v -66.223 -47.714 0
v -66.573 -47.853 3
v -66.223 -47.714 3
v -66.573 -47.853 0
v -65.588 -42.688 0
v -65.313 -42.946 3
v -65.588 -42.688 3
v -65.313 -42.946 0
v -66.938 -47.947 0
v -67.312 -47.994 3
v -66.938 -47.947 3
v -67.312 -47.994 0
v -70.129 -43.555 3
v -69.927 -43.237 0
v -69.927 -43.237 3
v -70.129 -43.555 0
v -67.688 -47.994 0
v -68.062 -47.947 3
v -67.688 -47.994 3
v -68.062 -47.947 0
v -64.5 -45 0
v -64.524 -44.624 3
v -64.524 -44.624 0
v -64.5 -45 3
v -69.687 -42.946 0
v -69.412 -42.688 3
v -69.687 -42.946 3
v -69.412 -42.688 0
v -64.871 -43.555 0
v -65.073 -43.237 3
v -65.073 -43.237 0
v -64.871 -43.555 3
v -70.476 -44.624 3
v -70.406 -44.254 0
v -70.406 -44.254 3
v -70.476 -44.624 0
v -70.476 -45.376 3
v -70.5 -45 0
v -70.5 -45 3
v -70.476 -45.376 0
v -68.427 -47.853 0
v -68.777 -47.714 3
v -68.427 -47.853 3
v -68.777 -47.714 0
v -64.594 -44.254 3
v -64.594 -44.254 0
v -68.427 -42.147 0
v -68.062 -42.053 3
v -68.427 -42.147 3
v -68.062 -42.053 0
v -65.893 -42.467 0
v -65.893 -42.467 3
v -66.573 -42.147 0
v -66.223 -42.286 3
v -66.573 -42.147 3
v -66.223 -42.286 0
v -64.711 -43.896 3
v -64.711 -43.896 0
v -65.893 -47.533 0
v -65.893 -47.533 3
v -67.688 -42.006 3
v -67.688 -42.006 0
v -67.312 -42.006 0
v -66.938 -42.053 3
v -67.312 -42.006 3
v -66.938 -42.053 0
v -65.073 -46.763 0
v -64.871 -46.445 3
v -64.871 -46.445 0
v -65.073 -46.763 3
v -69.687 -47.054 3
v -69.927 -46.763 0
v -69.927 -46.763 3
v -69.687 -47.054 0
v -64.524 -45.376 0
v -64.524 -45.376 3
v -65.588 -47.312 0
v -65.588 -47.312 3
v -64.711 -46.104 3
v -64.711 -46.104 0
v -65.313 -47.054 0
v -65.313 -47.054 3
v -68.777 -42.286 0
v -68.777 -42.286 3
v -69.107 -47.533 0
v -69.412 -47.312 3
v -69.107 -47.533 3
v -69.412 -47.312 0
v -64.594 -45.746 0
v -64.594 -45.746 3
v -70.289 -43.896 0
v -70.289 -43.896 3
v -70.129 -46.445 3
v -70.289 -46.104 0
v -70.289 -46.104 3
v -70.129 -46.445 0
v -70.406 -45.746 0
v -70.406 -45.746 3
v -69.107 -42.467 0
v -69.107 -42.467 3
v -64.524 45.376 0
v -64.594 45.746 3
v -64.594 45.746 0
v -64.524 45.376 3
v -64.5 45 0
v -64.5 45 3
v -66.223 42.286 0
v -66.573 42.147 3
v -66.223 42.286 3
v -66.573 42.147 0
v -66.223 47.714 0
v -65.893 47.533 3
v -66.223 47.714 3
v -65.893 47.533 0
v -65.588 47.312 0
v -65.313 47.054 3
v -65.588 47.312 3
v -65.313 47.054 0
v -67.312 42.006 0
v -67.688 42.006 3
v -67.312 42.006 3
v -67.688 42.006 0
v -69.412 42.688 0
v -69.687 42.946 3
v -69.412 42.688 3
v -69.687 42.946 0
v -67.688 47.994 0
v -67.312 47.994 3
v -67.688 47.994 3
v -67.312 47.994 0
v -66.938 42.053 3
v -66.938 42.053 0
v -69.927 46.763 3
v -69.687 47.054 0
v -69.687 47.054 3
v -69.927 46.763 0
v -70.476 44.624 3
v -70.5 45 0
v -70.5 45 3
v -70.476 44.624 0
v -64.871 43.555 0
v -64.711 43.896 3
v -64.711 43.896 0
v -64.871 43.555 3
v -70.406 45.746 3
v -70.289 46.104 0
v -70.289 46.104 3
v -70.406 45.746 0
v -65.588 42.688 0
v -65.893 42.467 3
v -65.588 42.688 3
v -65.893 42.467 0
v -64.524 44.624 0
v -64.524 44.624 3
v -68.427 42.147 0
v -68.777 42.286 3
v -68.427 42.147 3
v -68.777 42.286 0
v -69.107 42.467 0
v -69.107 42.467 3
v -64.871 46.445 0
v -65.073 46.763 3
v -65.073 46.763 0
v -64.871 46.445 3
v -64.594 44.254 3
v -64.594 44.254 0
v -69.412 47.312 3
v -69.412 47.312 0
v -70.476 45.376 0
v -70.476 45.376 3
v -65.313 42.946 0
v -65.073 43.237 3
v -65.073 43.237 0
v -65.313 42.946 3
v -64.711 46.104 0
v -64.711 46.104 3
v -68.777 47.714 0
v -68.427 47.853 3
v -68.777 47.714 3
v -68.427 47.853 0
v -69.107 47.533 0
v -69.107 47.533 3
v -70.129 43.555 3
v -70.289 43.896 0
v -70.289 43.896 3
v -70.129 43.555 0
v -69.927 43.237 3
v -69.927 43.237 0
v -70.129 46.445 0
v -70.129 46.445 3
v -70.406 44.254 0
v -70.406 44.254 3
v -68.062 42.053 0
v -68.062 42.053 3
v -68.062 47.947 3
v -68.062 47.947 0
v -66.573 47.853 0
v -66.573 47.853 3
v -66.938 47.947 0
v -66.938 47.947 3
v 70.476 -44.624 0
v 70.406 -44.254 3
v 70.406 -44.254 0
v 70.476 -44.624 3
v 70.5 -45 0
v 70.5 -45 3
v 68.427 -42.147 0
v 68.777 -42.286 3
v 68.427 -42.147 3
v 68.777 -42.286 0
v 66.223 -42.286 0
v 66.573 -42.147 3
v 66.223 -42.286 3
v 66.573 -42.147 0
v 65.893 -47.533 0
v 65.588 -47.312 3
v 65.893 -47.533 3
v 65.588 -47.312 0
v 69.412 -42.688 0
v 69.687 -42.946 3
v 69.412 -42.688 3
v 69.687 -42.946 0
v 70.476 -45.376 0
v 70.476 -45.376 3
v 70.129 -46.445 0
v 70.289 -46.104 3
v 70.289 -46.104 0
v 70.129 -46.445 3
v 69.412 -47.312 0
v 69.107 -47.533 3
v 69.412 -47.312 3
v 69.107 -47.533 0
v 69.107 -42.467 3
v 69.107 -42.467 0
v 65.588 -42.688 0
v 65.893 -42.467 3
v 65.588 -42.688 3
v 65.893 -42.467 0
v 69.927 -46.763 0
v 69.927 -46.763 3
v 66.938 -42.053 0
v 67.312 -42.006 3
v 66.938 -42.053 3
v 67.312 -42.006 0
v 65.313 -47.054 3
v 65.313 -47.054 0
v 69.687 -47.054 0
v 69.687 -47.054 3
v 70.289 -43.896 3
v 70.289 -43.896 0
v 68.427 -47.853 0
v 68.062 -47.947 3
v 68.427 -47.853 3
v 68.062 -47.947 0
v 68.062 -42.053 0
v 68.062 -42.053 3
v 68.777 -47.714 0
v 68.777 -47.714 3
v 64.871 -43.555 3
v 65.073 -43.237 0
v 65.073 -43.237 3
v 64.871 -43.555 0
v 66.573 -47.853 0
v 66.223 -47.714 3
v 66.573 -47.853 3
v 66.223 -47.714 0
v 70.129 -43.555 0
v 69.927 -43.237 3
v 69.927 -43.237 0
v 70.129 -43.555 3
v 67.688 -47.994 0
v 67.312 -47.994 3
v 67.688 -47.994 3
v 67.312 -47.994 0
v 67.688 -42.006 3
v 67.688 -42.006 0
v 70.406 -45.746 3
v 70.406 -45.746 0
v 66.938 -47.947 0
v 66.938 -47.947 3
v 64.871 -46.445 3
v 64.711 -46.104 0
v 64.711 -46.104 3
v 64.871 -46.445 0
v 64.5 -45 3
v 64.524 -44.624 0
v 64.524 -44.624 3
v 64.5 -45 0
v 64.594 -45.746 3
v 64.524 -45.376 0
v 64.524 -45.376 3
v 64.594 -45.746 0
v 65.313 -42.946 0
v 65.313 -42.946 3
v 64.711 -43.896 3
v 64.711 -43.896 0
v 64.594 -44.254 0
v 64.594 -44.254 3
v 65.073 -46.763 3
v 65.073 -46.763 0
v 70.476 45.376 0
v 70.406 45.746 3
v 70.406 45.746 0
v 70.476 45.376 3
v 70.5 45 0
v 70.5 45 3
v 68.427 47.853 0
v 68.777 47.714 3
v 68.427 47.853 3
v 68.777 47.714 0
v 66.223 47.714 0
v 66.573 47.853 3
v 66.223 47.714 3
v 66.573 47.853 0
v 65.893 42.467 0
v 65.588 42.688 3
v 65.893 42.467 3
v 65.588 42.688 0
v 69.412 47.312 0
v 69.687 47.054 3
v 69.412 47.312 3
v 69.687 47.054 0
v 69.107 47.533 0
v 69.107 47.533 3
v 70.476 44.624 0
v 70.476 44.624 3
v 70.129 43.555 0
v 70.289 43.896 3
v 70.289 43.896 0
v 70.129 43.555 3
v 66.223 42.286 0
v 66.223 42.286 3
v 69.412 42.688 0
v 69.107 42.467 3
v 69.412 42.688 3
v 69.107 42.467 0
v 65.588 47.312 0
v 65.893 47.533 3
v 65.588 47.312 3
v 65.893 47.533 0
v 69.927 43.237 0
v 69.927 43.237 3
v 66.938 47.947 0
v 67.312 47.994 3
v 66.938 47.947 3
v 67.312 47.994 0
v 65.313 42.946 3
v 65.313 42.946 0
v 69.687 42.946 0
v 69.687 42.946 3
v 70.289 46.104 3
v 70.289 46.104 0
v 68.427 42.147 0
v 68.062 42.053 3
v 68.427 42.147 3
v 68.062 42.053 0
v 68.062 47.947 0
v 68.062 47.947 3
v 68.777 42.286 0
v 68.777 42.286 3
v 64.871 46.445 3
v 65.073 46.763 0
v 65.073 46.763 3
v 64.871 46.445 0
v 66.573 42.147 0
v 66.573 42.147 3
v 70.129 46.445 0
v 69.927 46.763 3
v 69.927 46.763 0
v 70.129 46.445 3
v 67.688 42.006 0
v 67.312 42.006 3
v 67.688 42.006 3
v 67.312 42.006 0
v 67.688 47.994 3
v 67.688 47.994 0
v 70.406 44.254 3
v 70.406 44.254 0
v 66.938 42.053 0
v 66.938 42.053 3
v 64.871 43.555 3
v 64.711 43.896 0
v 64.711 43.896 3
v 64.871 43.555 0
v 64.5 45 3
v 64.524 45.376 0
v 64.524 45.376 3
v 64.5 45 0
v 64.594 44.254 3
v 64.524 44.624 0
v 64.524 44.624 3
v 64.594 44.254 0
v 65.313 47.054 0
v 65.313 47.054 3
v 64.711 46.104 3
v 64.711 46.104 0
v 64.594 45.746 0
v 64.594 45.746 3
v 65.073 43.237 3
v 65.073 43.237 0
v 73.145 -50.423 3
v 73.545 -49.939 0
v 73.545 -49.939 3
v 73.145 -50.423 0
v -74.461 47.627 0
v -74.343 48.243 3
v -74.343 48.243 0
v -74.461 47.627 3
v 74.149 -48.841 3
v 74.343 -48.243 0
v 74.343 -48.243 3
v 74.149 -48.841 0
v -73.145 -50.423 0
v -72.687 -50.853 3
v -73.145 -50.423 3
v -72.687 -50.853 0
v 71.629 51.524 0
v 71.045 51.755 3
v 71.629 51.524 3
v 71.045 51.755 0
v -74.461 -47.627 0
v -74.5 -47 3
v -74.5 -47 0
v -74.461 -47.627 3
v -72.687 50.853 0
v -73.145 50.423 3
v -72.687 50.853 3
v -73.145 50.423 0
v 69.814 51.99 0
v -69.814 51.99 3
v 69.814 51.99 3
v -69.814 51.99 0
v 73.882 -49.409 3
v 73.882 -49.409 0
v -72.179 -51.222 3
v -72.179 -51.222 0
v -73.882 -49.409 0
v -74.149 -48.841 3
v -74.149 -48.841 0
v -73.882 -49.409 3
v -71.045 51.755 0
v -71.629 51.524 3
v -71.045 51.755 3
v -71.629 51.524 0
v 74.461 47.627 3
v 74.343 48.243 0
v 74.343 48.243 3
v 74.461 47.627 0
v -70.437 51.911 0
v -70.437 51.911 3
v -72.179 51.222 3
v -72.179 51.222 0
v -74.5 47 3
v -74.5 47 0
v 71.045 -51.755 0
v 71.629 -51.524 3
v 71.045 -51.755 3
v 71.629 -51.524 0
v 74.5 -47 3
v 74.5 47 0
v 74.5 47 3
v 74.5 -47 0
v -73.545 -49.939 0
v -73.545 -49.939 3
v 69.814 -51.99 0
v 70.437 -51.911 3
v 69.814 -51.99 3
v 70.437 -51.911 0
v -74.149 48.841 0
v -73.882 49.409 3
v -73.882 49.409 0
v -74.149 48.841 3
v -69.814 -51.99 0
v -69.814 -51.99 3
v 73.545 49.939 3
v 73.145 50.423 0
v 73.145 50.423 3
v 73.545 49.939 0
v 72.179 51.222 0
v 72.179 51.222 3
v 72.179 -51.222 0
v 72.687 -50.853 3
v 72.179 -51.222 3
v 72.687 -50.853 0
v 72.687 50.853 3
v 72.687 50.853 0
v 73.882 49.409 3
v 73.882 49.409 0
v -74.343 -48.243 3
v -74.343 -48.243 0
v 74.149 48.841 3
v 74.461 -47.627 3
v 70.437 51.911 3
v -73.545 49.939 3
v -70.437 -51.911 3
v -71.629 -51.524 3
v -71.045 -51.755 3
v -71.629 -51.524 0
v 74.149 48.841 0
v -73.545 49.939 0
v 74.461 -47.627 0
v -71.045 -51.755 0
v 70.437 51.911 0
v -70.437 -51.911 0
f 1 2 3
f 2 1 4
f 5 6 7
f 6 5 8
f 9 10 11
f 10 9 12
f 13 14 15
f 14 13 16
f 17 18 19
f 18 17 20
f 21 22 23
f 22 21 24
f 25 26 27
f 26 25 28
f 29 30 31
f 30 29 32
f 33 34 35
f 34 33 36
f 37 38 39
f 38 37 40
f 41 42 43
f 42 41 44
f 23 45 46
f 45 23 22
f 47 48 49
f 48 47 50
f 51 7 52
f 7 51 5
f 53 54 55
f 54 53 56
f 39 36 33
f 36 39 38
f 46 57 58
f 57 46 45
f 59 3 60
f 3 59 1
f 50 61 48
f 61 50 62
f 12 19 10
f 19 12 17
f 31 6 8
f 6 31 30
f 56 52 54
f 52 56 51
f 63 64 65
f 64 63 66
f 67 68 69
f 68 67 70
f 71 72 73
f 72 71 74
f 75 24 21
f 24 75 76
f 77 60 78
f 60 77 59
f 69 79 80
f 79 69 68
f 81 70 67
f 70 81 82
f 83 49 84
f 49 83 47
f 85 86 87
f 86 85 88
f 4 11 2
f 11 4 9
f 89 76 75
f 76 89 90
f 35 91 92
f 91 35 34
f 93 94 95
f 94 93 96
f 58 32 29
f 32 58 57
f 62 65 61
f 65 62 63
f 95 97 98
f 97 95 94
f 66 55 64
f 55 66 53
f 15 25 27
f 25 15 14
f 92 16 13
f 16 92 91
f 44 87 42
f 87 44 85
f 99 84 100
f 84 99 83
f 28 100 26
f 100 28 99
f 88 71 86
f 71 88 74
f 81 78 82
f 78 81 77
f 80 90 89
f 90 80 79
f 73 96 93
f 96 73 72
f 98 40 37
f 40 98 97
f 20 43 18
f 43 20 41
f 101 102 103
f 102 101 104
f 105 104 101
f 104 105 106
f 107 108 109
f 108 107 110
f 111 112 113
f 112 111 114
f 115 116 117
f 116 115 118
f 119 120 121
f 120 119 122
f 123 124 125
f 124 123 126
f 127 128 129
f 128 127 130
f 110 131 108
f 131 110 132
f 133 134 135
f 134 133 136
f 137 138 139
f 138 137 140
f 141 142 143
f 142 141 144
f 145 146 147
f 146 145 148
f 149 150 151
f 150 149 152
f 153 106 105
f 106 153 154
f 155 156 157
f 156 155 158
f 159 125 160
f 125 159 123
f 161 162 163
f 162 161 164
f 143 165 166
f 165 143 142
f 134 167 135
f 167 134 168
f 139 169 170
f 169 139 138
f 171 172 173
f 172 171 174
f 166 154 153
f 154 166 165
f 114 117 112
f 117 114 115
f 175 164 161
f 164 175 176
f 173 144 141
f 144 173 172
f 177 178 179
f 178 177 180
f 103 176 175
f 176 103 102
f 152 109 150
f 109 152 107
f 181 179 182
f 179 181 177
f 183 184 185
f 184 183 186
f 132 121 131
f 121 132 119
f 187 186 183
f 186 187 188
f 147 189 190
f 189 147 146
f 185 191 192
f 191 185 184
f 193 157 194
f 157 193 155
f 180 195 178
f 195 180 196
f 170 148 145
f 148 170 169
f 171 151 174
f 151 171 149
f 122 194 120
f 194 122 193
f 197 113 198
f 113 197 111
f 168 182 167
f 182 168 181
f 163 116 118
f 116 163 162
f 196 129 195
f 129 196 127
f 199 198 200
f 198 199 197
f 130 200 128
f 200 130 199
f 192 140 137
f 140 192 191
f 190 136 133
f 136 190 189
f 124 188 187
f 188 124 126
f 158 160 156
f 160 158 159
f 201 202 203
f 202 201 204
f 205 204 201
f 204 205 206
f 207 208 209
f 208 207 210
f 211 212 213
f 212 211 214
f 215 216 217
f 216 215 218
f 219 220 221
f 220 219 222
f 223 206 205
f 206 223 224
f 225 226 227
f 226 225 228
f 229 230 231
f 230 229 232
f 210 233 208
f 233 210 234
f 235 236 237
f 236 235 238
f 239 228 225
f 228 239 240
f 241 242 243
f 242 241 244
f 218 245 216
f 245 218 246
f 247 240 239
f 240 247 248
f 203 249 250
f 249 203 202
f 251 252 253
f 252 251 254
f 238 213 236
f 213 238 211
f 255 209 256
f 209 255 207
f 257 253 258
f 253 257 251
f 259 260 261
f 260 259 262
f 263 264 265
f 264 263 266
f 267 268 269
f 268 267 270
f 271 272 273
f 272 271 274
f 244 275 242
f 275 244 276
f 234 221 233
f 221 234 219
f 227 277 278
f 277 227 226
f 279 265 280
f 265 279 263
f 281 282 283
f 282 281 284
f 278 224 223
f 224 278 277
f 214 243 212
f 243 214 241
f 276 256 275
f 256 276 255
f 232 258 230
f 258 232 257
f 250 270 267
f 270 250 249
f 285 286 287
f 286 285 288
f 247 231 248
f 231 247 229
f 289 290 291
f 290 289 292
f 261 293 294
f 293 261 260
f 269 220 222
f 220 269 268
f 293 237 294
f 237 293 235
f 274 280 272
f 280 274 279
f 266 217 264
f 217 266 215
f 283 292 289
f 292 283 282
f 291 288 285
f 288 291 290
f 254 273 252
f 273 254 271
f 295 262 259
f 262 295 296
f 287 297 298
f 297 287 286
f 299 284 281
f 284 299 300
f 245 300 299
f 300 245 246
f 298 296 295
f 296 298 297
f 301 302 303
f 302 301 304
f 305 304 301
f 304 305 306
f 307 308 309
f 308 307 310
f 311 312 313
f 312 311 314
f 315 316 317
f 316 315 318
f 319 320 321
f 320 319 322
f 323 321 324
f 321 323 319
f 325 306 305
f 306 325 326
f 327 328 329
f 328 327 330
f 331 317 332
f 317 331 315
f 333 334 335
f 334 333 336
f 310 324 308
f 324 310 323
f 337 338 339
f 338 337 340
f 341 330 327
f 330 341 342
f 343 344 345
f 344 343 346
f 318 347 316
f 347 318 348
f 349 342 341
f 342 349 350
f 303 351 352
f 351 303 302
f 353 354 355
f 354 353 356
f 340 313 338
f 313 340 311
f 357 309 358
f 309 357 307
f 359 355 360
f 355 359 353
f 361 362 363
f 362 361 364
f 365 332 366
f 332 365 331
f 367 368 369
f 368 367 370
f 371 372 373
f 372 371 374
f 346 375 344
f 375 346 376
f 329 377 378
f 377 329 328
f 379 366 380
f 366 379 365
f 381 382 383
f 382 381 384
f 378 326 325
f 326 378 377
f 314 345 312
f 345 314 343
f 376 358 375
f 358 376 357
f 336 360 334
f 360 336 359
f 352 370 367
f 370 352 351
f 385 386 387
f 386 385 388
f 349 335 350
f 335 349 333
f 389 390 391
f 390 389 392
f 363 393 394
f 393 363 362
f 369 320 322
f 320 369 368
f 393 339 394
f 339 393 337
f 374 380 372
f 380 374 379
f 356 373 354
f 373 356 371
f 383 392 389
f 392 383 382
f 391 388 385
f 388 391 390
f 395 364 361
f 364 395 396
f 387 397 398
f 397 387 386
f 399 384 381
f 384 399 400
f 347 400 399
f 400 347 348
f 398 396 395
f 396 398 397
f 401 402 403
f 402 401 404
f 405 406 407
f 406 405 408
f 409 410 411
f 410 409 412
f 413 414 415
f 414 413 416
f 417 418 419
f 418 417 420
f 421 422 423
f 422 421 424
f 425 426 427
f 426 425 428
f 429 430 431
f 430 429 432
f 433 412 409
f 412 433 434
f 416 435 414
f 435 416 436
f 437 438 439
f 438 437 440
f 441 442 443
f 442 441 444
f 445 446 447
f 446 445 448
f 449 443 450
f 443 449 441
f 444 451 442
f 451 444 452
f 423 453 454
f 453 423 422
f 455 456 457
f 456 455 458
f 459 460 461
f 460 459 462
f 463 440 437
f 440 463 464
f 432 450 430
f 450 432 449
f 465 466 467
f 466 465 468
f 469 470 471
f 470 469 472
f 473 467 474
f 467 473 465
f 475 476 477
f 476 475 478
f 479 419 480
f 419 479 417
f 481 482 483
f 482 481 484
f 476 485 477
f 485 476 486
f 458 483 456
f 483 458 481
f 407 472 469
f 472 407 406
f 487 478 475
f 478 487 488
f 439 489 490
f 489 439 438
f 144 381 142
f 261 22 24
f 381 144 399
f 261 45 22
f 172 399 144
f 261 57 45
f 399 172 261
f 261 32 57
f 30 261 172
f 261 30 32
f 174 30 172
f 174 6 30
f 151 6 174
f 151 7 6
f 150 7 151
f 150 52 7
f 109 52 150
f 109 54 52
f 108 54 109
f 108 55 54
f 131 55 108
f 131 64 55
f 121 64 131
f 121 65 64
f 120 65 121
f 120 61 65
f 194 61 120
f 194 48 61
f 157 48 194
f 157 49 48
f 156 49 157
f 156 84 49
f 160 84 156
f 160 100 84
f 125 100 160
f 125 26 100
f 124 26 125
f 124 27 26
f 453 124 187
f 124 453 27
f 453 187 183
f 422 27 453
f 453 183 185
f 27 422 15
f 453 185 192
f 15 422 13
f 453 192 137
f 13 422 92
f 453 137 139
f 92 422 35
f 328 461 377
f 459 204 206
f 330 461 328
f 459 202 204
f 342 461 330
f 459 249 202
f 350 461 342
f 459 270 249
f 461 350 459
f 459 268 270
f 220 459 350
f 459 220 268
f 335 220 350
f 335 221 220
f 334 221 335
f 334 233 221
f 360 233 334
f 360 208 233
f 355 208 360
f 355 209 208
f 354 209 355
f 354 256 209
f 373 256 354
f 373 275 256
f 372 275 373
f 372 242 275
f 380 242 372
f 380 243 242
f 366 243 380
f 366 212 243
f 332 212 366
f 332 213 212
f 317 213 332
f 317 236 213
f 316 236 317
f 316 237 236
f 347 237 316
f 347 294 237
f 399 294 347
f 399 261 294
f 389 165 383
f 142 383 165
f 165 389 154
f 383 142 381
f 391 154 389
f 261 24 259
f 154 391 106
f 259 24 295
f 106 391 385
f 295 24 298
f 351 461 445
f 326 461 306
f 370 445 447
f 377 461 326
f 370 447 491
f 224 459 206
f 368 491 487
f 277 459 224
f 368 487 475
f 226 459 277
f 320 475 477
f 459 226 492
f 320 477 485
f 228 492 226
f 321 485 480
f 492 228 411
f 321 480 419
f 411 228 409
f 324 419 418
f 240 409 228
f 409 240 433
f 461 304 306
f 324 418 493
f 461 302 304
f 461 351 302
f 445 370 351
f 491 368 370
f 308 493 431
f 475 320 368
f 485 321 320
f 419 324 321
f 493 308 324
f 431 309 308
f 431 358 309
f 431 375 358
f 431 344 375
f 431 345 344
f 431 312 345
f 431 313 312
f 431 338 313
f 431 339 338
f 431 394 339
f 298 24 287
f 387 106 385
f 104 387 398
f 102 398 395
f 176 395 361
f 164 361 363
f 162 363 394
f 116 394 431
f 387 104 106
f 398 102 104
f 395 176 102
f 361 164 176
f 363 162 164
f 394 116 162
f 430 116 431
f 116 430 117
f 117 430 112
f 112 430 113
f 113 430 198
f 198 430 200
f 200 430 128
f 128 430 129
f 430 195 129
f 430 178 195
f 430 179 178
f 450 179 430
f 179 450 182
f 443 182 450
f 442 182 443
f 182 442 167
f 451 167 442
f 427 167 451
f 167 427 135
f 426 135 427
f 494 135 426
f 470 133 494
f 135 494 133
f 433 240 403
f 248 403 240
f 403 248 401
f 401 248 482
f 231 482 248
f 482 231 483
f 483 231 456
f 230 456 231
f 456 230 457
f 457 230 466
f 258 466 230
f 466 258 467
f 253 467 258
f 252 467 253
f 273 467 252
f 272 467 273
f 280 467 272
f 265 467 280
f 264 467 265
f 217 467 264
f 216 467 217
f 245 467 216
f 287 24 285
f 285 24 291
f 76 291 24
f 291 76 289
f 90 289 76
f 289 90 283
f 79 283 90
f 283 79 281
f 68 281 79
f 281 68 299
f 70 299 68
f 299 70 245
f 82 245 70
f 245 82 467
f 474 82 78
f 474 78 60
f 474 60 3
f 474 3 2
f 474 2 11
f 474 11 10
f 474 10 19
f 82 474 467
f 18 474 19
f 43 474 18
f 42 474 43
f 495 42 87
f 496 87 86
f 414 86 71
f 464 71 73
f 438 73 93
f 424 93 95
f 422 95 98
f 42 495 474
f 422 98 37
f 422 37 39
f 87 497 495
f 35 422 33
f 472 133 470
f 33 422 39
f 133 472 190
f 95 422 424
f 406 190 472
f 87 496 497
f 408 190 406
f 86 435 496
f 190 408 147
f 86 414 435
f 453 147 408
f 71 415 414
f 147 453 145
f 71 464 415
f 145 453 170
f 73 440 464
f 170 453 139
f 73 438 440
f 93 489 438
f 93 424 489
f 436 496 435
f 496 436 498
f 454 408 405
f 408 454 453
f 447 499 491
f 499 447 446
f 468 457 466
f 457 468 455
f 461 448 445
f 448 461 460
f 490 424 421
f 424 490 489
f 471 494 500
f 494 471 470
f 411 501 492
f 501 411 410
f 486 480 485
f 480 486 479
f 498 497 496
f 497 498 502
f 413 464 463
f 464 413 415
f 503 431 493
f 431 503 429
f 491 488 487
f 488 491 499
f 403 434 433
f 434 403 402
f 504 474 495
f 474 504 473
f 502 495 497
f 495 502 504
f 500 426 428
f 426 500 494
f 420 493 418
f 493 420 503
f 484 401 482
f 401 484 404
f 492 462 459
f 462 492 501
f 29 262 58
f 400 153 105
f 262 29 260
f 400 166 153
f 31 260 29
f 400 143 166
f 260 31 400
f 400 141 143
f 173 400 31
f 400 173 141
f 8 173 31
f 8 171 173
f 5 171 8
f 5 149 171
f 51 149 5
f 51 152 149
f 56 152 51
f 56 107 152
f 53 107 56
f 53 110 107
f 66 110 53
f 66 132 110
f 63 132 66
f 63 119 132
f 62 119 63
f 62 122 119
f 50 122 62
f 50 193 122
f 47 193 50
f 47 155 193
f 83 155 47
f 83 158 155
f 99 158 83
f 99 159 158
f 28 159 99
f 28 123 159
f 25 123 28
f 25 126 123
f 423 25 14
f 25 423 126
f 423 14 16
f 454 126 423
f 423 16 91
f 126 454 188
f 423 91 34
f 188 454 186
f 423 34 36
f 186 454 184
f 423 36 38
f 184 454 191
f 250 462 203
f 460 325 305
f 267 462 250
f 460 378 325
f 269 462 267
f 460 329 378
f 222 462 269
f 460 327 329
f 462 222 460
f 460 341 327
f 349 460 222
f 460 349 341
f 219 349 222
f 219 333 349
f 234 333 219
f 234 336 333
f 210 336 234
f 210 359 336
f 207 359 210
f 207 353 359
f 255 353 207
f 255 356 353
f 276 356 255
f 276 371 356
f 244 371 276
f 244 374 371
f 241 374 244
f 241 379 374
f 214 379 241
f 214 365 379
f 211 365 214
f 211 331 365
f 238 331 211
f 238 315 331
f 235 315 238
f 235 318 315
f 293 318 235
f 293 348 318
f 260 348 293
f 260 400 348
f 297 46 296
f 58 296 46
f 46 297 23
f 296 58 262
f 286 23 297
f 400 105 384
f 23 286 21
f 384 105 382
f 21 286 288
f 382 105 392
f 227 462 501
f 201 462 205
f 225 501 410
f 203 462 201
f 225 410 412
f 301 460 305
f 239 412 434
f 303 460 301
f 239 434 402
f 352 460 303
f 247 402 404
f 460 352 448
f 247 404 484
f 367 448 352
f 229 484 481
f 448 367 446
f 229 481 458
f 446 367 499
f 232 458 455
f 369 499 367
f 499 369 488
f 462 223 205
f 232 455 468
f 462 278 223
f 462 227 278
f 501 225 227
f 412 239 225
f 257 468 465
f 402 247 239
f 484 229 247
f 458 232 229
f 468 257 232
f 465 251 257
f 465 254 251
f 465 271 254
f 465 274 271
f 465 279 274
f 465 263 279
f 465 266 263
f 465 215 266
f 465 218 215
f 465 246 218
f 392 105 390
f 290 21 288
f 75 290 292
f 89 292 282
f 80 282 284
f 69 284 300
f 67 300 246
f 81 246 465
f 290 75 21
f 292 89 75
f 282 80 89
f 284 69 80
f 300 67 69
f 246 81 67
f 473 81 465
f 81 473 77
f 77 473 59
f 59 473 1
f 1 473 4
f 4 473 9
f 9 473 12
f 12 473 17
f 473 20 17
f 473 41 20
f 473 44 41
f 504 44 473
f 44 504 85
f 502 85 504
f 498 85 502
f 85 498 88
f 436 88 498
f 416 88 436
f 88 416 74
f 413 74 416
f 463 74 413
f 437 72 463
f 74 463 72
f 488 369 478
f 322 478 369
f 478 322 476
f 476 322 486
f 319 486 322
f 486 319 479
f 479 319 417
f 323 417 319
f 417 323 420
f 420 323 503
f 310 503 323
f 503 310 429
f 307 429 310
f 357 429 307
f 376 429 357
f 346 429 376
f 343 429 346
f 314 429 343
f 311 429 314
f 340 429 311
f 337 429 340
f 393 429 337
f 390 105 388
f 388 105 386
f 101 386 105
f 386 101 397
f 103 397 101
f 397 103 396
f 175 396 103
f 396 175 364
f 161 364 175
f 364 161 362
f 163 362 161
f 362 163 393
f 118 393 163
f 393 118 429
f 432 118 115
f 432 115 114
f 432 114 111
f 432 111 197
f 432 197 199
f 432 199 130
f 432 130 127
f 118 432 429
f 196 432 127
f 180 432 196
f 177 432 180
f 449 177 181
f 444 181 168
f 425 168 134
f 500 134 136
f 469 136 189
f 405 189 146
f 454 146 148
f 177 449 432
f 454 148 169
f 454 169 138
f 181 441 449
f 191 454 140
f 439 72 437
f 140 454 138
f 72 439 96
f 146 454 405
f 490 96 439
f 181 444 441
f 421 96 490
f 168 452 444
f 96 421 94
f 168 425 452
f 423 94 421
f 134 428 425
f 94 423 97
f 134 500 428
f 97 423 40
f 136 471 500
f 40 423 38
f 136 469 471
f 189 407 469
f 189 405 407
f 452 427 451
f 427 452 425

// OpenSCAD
$fn = 50;


difference() {
	union() {
		hull() {
			translate(v = [-69.5000000000, 47.0000000000, 0]) {
				cylinder(h = 3, r = 5);
			}
			translate(v = [69.5000000000, 47.0000000000, 0]) {
				cylinder(h = 3, r = 5);
			}
			translate(v = [-69.5000000000, -47.0000000000, 0]) {
				cylinder(h = 3, r = 5);
			}
			translate(v = [69.5000000000, -47.0000000000, 0]) {
				cylinder(h = 3, r = 5);
			}
		}
	}
	union() {
		translate(v = [-67.5000000000, -45.0000000000, -100.0000000000]) {
			cylinder(h = 200, r = 3.0000000000);
		}
		translate(v = [-67.5000000000, 45.0000000000, -100.0000000000]) {
			cylinder(h = 200, r = 3.0000000000);
		}
		translate(v = [67.5000000000, -45.0000000000, -100.0000000000]) {
			cylinder(h = 200, r = 3.0000000000);
		}
		translate(v = [67.5000000000, 45.0000000000, -100.0000000000]) {
			cylinder(h = 200, r = 3.0000000000);
		}
	}
}
